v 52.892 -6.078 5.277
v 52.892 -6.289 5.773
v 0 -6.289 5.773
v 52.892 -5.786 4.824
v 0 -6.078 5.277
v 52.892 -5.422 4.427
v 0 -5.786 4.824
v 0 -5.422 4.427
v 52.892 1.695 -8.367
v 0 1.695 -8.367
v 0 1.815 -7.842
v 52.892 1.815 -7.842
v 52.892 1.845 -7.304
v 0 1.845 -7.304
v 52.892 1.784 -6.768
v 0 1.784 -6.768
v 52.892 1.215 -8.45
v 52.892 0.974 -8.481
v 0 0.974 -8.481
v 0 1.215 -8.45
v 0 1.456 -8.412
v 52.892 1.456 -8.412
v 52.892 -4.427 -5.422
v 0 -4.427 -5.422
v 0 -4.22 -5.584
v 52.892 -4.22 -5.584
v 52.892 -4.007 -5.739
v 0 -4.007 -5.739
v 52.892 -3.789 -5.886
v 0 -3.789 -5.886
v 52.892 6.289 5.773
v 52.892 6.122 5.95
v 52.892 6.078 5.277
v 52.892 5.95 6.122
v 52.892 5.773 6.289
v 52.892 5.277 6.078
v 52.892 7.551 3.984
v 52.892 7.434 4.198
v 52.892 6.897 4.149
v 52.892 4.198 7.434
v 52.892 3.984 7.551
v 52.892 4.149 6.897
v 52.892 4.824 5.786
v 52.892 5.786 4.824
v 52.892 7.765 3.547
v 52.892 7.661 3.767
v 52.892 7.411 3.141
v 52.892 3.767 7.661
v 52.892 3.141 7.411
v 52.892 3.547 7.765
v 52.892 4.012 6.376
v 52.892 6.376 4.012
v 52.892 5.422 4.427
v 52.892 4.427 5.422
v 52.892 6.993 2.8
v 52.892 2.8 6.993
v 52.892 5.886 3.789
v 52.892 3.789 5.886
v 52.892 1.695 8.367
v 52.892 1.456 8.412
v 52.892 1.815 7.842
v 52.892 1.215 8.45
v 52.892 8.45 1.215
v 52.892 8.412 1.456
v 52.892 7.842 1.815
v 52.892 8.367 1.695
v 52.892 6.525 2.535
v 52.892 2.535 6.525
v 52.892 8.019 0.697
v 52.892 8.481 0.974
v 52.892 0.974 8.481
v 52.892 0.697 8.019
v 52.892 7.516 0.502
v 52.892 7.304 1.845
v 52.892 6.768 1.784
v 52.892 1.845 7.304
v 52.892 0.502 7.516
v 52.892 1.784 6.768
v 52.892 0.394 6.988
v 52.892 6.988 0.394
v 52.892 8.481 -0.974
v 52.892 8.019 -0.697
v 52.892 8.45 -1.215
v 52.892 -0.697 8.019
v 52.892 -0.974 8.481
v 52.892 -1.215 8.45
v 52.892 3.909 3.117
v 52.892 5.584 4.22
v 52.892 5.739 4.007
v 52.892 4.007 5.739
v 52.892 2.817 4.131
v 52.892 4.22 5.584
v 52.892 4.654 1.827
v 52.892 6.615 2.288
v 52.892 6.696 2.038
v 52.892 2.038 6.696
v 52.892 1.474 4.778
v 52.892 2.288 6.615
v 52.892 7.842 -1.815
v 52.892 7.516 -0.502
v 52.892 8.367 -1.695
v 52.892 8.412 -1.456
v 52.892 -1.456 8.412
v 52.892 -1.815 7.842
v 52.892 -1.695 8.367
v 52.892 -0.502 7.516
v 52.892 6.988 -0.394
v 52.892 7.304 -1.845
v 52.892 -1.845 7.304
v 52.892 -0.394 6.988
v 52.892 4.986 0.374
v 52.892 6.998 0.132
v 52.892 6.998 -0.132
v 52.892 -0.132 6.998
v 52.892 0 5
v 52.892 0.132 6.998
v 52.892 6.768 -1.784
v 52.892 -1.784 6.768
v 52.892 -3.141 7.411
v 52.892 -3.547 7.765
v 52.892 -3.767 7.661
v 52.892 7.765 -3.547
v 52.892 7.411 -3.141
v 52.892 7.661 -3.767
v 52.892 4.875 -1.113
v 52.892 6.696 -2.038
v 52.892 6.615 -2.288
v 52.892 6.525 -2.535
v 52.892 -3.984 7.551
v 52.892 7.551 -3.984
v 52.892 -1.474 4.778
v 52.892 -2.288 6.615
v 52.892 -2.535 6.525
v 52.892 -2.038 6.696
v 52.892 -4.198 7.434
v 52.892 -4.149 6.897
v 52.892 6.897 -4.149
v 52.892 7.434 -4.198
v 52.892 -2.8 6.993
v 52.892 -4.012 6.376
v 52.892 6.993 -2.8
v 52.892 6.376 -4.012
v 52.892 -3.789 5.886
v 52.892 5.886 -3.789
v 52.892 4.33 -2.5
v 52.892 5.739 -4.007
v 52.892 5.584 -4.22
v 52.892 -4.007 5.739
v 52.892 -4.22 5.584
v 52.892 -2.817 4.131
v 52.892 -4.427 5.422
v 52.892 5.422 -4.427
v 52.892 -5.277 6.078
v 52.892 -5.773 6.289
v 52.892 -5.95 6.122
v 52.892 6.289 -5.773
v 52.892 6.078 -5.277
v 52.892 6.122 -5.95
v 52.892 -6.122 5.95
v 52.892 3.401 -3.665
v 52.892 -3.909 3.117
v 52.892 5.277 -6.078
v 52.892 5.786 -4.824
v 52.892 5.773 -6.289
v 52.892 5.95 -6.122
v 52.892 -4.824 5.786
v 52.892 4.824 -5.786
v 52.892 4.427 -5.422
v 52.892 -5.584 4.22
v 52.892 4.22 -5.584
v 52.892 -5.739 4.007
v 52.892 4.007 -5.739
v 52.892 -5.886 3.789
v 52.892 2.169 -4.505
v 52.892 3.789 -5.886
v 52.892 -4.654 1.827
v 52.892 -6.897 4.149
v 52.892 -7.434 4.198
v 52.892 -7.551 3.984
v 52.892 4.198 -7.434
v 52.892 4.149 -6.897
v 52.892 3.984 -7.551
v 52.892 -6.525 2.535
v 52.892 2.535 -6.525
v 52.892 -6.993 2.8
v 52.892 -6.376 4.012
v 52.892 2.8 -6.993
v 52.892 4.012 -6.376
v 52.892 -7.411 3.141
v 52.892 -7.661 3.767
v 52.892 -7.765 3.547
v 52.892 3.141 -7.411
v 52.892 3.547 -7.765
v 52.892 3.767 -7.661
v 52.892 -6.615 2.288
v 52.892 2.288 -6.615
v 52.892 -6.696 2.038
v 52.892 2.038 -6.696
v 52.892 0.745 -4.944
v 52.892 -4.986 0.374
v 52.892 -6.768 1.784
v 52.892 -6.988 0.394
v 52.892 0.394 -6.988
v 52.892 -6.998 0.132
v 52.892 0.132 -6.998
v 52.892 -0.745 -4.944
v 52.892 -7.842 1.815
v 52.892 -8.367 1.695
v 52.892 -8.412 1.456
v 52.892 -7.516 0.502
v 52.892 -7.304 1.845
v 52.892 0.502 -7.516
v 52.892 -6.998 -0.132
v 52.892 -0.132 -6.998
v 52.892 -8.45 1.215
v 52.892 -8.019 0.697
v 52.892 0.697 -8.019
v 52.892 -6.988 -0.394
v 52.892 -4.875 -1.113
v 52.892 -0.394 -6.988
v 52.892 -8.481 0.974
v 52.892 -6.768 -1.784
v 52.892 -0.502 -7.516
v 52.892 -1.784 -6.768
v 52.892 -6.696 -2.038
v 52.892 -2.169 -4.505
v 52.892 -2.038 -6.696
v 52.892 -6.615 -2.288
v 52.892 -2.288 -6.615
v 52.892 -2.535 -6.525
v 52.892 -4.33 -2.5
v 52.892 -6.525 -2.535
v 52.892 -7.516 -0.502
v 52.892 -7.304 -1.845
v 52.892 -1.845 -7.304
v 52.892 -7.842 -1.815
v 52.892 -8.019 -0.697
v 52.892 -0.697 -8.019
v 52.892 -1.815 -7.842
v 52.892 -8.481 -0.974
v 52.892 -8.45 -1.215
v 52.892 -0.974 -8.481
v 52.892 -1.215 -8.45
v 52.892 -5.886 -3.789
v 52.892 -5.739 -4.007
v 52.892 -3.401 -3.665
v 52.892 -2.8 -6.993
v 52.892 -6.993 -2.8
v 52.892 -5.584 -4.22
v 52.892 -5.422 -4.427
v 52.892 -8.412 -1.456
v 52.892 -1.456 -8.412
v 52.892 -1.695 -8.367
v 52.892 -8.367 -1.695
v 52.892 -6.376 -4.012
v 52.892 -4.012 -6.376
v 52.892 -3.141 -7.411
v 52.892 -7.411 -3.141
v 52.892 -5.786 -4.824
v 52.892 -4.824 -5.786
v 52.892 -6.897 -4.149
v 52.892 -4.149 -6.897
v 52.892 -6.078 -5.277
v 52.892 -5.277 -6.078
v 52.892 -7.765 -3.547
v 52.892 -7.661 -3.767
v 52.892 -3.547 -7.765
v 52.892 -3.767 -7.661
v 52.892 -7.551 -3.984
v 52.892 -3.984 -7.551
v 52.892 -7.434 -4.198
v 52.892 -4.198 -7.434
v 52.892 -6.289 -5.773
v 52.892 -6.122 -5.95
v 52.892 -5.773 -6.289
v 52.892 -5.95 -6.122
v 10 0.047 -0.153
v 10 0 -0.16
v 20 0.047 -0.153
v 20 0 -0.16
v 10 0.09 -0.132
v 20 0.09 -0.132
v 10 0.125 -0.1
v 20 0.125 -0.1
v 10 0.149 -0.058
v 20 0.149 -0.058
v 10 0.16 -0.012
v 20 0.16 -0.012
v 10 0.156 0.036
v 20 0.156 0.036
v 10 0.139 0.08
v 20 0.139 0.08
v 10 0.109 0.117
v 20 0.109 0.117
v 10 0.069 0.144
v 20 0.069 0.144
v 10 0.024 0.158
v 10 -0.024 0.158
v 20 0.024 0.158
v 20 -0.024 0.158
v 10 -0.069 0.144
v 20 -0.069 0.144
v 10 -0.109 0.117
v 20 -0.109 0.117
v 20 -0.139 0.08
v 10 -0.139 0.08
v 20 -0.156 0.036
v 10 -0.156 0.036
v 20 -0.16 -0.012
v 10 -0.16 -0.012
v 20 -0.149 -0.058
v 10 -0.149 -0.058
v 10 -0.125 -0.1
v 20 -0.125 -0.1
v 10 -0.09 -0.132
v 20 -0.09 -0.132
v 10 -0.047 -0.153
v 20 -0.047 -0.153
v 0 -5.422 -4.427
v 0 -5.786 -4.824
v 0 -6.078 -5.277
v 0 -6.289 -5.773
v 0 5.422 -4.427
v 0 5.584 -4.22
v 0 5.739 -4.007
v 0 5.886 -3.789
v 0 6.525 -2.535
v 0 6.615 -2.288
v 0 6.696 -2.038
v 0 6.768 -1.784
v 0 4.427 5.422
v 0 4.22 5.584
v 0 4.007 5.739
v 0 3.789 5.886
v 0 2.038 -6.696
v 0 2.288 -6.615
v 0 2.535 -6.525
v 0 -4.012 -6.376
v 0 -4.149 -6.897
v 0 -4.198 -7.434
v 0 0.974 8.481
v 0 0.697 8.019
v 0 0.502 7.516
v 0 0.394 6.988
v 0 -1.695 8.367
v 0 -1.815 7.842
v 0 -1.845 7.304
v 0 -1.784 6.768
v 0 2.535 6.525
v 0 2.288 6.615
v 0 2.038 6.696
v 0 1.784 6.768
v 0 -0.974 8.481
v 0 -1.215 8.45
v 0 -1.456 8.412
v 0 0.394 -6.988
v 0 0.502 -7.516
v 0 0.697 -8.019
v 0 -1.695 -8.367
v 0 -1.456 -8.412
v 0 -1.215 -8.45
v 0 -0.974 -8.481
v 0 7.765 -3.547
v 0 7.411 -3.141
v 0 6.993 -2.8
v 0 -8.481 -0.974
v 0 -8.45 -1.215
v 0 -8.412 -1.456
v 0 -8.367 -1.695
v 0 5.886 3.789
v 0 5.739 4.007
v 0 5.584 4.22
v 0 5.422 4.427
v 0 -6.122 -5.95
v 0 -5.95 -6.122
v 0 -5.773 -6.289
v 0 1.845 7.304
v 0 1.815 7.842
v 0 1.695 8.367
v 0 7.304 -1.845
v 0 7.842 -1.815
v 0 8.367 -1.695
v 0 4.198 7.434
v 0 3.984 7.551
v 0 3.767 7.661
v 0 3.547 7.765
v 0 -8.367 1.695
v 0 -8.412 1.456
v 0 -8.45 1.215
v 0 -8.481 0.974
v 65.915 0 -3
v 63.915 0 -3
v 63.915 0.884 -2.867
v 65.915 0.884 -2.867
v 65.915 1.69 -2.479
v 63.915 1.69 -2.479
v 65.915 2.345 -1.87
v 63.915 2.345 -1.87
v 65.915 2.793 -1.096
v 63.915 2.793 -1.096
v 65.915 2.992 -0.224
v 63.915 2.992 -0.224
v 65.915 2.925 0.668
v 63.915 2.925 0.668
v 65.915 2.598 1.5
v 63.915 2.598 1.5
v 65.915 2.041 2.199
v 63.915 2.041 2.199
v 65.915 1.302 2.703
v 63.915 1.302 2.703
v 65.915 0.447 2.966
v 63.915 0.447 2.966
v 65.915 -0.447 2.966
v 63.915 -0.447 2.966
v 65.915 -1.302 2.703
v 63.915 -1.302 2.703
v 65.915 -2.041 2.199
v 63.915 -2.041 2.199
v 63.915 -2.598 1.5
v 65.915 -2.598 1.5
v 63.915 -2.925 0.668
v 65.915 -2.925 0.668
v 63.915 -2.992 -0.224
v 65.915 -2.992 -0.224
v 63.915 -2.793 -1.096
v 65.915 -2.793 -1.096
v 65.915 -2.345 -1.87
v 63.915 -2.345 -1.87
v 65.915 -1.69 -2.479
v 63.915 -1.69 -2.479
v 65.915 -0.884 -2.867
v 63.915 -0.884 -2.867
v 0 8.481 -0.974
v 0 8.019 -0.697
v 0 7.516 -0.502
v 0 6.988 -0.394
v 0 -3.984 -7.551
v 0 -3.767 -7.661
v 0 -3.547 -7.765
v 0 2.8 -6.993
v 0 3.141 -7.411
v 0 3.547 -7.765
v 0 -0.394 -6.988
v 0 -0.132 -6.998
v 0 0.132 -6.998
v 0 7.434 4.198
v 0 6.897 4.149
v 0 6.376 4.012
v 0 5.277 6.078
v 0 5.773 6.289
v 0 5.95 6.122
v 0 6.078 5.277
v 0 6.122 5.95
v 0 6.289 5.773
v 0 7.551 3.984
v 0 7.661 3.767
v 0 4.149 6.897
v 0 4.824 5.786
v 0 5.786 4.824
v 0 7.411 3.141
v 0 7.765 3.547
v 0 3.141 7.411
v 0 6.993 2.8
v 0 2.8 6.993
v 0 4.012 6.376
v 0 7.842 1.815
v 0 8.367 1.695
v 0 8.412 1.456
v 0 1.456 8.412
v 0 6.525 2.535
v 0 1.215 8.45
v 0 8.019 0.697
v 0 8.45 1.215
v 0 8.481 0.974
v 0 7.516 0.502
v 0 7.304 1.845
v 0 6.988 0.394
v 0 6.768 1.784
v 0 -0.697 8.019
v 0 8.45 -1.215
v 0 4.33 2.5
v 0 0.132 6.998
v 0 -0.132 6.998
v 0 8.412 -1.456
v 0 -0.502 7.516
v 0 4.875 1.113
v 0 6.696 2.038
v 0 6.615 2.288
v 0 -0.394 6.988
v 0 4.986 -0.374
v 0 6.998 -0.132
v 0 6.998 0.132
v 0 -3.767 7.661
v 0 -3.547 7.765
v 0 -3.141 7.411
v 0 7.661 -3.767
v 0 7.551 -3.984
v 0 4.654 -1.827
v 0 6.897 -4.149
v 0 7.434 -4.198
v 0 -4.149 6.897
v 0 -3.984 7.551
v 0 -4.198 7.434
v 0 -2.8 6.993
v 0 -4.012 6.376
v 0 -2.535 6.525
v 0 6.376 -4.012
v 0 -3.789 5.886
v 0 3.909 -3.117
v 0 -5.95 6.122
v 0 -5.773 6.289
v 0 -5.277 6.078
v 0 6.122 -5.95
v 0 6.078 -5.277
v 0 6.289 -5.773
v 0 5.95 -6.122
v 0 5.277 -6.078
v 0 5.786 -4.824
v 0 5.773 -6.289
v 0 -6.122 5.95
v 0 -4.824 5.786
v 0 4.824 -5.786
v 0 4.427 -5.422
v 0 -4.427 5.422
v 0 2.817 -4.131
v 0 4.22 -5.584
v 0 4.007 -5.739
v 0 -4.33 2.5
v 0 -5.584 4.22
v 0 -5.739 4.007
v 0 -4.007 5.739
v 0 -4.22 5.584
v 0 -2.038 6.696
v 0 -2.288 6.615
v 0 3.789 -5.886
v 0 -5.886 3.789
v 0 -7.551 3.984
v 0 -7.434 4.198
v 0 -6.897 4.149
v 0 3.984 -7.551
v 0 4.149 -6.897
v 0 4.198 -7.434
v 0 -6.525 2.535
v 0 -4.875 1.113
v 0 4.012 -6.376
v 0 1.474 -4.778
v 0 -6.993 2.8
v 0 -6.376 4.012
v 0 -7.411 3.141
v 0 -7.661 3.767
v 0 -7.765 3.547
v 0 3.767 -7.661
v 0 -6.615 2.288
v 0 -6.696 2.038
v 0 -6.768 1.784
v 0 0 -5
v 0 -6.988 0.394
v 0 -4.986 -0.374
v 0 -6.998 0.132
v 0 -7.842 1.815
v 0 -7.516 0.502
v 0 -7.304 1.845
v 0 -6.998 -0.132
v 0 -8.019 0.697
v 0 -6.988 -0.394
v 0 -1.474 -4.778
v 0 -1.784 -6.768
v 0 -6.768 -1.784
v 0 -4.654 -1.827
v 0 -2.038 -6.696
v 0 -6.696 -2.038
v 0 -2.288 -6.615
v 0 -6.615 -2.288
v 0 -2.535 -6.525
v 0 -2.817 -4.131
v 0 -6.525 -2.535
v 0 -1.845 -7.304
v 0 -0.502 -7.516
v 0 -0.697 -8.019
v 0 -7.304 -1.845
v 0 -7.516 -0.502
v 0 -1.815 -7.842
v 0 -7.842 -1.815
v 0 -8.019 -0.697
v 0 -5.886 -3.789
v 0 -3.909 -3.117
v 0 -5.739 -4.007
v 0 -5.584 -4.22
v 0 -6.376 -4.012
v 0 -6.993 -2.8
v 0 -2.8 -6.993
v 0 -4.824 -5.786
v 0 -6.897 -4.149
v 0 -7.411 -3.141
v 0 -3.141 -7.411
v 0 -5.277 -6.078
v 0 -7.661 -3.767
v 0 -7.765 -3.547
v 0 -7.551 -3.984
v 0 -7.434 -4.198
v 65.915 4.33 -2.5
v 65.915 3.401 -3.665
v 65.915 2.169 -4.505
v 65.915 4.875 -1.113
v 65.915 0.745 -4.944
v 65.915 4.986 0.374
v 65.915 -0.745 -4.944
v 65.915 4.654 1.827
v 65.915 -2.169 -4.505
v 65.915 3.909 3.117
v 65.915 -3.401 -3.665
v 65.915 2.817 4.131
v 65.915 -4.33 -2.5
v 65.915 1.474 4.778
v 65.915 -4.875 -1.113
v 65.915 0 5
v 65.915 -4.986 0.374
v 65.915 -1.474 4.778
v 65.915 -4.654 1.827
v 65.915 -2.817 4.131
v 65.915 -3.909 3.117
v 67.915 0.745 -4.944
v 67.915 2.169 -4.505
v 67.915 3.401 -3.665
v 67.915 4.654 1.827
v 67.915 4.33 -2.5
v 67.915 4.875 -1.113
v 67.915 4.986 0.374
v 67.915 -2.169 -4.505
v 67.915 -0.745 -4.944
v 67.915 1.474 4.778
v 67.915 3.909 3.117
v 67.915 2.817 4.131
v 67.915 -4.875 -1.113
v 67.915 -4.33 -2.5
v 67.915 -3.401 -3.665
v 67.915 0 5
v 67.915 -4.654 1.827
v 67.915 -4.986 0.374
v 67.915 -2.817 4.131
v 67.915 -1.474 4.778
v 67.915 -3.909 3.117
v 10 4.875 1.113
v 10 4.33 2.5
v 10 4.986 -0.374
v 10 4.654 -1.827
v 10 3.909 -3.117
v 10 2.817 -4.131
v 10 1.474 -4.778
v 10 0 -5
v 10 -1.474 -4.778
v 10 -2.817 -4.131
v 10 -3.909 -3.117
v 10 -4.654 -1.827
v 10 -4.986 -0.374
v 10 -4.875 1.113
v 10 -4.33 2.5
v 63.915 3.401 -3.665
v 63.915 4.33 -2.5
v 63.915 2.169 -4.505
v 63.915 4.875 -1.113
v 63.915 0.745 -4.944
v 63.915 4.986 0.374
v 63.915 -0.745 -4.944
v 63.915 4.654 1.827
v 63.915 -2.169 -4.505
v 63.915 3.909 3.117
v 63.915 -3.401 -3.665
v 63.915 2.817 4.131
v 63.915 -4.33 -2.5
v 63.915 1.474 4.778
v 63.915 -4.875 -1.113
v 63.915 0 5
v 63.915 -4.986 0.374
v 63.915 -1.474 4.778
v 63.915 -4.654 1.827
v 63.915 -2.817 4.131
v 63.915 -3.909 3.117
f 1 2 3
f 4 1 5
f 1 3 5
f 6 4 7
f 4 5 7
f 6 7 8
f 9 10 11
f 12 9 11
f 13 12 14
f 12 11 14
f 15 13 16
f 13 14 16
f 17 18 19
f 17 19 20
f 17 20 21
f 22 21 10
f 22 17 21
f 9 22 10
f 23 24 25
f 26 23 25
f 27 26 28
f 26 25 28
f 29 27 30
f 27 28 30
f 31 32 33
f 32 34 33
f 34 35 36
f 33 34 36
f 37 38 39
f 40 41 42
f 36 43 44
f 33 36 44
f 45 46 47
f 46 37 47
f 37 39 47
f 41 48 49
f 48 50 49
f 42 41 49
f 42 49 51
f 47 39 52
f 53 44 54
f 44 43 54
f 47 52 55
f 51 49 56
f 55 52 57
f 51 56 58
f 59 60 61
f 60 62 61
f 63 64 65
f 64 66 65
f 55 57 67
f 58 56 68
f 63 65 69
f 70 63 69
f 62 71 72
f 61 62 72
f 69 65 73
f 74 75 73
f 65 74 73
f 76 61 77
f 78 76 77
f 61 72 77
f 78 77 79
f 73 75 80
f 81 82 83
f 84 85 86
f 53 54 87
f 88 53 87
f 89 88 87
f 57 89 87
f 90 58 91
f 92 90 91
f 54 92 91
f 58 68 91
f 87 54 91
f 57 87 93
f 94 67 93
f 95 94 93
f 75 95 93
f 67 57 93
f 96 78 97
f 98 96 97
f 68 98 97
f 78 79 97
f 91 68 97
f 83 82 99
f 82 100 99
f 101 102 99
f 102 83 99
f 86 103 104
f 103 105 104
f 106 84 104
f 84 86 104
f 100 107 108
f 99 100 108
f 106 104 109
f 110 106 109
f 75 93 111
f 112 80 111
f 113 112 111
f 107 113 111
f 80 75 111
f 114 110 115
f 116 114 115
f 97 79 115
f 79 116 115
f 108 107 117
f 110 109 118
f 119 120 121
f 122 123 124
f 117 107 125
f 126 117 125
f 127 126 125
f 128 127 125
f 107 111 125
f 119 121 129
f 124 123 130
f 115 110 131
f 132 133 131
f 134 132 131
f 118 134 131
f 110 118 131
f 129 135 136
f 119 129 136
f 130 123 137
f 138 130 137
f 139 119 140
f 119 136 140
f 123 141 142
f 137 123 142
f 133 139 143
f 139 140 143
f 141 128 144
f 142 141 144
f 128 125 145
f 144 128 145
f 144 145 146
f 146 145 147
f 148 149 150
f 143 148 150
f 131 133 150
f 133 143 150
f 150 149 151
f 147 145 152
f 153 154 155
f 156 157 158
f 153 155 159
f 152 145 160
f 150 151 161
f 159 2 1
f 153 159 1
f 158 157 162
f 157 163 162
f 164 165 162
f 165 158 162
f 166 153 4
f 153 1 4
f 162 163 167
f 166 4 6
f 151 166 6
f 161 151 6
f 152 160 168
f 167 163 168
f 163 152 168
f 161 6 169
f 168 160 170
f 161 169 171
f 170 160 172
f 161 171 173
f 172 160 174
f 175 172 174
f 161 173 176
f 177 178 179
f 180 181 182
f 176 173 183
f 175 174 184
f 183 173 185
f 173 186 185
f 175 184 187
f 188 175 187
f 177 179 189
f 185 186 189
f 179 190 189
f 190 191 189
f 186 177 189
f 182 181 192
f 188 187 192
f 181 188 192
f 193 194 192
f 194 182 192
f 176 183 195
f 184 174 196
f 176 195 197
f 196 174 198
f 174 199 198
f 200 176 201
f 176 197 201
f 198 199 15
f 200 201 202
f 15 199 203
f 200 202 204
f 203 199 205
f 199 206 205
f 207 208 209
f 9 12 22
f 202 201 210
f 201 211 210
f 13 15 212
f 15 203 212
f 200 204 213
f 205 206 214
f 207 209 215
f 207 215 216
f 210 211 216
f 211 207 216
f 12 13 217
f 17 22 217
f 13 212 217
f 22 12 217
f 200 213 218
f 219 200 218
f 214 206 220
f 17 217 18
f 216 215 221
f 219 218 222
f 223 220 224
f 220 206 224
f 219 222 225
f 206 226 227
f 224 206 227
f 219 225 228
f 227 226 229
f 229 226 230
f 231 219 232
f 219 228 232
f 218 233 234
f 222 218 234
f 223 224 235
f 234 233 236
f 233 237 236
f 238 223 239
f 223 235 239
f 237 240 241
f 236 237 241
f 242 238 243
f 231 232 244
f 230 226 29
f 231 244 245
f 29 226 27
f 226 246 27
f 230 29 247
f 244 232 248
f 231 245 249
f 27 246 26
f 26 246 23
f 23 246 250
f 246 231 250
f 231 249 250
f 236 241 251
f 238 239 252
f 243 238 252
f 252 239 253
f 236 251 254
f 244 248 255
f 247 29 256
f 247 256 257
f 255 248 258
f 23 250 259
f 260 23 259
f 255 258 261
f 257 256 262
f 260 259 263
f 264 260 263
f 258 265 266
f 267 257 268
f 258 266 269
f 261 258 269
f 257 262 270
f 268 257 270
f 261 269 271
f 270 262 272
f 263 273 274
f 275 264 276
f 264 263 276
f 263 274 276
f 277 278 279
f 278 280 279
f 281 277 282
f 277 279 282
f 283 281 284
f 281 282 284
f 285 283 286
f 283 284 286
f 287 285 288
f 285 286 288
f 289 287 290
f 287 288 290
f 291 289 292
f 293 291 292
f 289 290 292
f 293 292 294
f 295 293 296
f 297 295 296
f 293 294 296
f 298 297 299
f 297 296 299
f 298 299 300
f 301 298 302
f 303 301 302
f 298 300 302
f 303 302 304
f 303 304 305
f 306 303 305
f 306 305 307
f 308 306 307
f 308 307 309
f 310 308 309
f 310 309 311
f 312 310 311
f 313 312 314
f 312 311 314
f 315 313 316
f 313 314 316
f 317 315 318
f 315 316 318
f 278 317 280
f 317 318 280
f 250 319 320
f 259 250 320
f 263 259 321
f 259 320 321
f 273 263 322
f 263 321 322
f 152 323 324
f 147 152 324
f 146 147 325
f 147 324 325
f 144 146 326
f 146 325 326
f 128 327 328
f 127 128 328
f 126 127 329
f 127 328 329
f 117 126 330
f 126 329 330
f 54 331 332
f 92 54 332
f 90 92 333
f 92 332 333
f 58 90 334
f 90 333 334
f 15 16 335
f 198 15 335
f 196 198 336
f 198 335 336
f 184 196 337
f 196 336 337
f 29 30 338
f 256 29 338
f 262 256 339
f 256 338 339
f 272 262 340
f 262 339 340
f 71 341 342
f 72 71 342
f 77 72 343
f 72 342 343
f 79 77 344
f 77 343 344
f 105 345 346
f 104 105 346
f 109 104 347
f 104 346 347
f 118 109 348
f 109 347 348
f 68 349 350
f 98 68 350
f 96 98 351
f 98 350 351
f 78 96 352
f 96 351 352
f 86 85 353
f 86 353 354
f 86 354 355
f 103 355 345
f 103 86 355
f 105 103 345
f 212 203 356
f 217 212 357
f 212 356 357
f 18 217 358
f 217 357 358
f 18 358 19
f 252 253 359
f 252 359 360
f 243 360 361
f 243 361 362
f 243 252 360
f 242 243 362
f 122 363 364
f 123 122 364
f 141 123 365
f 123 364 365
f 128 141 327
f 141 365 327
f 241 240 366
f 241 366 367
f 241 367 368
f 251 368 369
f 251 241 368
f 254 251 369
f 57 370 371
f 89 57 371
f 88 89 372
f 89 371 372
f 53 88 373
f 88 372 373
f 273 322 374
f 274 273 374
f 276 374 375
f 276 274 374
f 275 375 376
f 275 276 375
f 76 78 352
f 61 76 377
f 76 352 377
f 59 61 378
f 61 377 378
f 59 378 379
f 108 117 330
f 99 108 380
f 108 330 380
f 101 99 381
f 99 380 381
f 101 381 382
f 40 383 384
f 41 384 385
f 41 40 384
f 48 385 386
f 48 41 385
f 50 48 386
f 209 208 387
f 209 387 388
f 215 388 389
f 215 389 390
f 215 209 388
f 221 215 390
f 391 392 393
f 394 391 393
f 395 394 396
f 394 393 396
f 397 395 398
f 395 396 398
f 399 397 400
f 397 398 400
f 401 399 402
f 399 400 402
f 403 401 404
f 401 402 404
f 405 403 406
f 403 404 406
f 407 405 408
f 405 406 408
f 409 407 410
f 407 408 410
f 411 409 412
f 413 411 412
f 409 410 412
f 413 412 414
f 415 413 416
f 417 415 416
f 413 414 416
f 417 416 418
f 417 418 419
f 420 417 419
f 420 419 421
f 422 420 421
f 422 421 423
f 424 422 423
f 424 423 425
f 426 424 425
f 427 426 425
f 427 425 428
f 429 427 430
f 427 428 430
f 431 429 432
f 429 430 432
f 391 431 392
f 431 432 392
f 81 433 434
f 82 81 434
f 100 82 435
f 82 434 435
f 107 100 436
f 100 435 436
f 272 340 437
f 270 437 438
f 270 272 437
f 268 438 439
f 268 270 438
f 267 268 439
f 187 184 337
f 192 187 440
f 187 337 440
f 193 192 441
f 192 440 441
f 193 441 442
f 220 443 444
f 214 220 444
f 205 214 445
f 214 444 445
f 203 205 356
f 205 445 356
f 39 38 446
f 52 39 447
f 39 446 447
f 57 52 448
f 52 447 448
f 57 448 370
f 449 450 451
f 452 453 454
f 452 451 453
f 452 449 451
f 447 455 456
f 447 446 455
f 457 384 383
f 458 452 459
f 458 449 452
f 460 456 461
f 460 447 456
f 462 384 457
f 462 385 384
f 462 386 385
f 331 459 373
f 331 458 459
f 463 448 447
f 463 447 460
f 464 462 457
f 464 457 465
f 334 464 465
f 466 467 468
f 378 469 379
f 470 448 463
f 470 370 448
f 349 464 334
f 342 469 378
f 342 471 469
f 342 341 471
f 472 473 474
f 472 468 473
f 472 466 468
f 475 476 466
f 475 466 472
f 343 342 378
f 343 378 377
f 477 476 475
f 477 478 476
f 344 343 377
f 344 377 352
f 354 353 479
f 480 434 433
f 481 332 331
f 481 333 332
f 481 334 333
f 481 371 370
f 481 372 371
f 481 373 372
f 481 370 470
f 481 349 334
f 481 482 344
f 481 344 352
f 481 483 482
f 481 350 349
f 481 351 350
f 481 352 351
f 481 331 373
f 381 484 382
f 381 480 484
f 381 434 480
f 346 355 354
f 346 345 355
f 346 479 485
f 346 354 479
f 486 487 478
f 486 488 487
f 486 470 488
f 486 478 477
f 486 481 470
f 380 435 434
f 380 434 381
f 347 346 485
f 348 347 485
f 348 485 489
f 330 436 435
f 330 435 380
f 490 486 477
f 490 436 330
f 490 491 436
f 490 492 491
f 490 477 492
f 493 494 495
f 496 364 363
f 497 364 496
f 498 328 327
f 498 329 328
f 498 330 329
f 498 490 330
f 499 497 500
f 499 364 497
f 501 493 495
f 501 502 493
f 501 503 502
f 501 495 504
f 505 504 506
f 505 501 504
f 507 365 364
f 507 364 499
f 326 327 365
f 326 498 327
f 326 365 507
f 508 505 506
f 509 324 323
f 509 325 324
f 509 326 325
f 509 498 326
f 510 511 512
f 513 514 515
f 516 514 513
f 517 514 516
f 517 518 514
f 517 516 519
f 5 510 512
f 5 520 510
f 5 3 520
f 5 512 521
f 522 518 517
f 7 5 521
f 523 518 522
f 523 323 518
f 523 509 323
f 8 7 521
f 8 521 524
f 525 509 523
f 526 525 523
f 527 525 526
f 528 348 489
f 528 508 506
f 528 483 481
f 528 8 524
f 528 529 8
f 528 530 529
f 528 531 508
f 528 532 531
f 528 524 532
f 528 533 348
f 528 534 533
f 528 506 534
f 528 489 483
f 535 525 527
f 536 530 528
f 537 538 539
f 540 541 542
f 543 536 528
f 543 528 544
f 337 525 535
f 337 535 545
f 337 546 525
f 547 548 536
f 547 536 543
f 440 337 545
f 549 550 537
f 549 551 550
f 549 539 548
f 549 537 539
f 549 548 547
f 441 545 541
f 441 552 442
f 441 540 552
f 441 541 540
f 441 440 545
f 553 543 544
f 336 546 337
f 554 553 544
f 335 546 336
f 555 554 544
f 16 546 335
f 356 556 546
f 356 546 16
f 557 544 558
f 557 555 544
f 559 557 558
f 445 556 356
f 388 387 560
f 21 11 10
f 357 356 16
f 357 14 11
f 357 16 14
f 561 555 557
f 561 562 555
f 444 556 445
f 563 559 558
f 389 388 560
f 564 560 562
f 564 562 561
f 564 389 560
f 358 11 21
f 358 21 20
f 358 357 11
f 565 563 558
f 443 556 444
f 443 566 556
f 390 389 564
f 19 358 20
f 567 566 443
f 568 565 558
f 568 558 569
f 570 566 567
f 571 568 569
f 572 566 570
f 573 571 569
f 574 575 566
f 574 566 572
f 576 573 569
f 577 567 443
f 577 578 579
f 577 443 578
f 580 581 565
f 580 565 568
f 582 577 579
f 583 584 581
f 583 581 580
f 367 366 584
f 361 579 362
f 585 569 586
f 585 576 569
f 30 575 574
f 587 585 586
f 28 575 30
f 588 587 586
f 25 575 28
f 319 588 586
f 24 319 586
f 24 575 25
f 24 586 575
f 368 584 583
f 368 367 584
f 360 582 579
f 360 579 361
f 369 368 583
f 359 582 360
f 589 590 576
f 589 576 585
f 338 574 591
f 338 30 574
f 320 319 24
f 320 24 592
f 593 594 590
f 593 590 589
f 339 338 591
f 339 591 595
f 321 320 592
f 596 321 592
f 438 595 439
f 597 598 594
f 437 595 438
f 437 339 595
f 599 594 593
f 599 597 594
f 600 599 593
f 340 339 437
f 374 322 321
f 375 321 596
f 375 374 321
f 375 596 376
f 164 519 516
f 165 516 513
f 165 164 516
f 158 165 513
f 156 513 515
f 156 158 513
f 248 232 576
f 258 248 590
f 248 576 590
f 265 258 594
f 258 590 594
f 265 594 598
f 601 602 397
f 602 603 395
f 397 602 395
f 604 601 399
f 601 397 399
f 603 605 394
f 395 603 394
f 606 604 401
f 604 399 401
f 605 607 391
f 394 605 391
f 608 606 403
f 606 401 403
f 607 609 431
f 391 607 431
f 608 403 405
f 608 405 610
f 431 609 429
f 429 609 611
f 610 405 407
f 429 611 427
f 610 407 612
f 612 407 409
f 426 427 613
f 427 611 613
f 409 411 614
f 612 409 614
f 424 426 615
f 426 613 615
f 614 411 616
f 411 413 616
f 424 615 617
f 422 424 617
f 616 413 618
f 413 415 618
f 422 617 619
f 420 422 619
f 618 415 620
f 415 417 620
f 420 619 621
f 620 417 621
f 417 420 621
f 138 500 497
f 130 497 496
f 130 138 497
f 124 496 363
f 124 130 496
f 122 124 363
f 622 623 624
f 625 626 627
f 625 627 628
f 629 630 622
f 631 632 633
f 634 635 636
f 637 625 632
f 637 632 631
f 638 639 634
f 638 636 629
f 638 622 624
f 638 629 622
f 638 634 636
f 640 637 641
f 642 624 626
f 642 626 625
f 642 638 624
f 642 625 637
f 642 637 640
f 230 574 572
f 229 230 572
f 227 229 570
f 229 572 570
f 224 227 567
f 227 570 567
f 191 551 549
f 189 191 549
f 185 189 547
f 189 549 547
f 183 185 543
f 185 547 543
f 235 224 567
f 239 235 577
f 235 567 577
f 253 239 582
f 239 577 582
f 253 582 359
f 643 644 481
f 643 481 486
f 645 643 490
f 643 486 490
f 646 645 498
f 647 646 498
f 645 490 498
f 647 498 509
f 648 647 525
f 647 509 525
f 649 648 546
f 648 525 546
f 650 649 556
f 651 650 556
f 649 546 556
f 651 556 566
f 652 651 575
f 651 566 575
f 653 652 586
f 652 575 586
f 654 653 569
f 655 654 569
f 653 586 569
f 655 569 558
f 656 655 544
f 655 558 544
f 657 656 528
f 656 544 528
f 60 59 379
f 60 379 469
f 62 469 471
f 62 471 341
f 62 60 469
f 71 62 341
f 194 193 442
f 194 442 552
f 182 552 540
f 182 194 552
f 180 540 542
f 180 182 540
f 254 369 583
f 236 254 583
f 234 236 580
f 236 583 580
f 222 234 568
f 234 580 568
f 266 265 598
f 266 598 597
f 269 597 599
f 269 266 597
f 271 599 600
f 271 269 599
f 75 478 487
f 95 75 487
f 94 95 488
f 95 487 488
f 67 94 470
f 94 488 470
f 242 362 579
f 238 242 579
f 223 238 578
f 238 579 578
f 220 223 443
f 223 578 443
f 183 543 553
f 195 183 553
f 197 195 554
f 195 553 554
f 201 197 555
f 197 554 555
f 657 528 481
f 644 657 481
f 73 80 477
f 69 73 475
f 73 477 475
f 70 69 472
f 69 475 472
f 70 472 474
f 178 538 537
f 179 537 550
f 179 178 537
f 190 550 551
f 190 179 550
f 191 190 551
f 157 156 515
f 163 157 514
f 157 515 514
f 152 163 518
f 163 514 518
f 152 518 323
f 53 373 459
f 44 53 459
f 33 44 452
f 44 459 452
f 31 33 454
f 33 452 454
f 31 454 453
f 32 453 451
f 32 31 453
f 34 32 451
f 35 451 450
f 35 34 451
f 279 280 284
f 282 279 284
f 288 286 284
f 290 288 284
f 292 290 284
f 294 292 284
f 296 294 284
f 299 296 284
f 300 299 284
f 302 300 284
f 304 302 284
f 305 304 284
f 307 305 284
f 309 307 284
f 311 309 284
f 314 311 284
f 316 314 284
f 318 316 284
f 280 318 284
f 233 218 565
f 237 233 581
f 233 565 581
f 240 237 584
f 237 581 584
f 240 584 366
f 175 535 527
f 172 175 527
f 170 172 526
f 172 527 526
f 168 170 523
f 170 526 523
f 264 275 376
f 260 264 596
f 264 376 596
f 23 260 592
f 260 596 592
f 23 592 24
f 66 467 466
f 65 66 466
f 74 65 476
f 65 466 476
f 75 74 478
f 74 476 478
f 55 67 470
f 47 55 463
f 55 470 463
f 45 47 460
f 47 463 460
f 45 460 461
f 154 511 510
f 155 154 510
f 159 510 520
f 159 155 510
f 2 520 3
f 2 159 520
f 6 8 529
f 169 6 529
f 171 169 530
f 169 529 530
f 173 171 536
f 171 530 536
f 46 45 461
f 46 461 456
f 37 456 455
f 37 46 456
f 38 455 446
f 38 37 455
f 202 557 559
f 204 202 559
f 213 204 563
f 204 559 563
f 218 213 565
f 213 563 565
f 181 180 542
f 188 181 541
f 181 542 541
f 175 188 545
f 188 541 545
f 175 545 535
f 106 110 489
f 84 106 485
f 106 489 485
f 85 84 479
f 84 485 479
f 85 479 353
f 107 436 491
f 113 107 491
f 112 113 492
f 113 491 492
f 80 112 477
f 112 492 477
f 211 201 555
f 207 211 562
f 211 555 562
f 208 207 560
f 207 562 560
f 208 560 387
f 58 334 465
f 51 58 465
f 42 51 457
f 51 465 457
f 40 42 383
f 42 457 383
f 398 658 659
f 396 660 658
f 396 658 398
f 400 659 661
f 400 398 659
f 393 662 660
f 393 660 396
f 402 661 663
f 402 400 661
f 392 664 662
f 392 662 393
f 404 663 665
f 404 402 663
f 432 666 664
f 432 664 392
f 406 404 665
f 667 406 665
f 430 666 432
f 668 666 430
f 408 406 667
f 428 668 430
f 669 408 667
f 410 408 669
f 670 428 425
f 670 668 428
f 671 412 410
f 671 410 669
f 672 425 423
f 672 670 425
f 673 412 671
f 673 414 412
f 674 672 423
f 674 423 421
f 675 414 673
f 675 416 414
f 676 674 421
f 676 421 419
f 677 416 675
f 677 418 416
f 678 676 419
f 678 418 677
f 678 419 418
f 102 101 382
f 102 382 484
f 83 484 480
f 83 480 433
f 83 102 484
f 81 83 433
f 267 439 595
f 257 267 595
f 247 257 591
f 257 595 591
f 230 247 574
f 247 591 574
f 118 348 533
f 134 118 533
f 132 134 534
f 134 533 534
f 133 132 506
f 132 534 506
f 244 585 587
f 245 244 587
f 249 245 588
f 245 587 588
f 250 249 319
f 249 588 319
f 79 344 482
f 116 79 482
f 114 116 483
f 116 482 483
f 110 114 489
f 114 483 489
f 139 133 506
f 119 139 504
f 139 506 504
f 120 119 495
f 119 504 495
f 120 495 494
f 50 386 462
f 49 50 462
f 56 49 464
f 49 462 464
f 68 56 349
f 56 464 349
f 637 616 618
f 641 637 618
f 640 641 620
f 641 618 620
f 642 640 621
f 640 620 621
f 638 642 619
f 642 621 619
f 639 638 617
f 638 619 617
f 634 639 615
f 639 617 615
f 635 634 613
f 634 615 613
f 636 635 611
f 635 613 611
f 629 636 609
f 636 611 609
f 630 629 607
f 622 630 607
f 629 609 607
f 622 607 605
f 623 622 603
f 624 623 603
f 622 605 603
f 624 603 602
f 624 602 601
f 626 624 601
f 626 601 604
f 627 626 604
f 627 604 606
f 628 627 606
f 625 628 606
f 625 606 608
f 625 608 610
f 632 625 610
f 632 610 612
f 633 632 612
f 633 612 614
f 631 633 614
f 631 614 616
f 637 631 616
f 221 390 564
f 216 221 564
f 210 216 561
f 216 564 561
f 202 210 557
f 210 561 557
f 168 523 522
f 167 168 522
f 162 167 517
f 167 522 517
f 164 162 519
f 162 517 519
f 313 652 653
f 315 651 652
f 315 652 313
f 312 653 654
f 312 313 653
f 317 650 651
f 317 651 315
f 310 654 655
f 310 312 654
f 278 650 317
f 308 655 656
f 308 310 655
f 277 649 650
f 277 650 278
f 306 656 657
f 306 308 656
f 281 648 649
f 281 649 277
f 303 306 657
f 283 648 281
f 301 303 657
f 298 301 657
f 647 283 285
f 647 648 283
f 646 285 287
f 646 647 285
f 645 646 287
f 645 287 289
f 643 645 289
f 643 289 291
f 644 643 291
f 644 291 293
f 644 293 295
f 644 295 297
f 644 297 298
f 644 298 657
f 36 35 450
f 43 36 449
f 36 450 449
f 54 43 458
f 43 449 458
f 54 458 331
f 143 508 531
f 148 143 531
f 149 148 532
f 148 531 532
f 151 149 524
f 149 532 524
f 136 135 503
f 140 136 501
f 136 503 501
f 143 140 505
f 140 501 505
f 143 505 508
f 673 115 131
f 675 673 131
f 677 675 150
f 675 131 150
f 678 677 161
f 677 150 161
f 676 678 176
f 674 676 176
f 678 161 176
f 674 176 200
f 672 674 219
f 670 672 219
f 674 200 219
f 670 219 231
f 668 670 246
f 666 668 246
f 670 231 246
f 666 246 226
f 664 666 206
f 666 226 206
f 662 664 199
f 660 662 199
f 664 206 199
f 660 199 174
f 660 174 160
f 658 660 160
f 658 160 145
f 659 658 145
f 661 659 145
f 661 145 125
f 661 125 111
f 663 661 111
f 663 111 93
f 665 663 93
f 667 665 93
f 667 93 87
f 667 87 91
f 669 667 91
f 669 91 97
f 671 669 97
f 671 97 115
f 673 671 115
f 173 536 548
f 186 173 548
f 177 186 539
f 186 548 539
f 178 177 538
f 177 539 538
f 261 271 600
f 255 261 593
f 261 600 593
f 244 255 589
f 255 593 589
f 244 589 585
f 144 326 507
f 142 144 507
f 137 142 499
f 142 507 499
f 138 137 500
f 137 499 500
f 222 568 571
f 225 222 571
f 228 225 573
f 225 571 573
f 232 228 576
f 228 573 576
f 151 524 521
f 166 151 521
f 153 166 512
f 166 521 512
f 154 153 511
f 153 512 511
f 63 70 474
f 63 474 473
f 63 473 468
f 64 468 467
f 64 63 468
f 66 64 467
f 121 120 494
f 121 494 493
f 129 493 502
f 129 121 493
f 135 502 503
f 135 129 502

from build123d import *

# Parameters (mm, degrees)
BASPROSKE_W         = 132.2299391
BASPROSKE_H         = 22
TOOTHCUT_DEPTH      = 136.840924593
TEETHCUTS_COUNT     = 20
TEETHCUTS_ANGLE     = 342
BORSKE_R            = 0.4
BORE_DEPTH          = 50.0000508
SKETCH1_R           = 22
SKETCH1_R_2         = 21.342673338
CUT_EXTRUDE1_DEPTH  = 136.778456297
SCALE1_SCALE        = 0.4
SKETCH6_R           = 5
BOSS_EXTRUDE3_DEPTH = 15.0233807
CUT_EXTRUDE2_DEPTH  = 10
CUT_EXTRUDE3_START  = -2
SKETCH8_R           = 5
SKETCH8_R_2         = 3
CUT_EXTRUDE3_DEPTH  = 2


with BuildPart() as part:
    # BasProSke → Base-Revolve (revolve)
    with BuildSketch(Plane(origin=(0, 0, 0), x_dir=(1, 0, 0), z_dir=(0, 1, 0)), mode=Mode.PRIVATE) as base_revolve_sk:
        with Locations((66.11496955, 11)):
            Rectangle(BASPROSKE_W, BASPROSKE_H)
    revolve(base_revolve_sk.sketch.rotate(Axis((-10, 0, 0), (1, 0, 0)), 180), axis=Axis((-10, 0, 0), (1, 0, 0)))

    # TooCutSke → ToothCut (cut, through all)
    with BuildSketch(Plane(origin=(0, 0, 0), x_dir=(0, 0, -1), z_dir=(1, 0, 0))):
        with BuildLine():
            ThreePointArc((0.986171591, 17.471189616), (0, 17.499), (-0.986171591, 17.471189616))
            ThreePointArc((-0.986171591, 17.471189616), (-1.626916196, 19.798789858), (-2.932850173, 21.829260982))
            ThreePointArc((-2.932850173, 21.829260982), (0, 22.0254), (2.932850173, 21.829260982))
            ThreePointArc((2.932850173, 21.829260982), (1.626916196, 19.798789858), (0.986171591, 17.471189616))
        make_face()
    toothcut = extrude(amount=TOOTHCUT_DEPTH, mode=Mode.SUBTRACT)

    # TeethCuts: ToothCut ×20 about axis
    teethcuts_axis = Axis((-10, 0, 0), (1, 0, 0))
    for i in range(1, TEETHCUTS_COUNT):
        add(toothcut.rotate(teethcuts_axis, i * TEETHCUTS_ANGLE / (TEETHCUTS_COUNT - 1)), mode=Mode.SUBTRACT)

    # BorSke → Bore (cut, symmetric)
    with BuildSketch(Plane(origin=(0, 0, 0), x_dir=(0, 0, -1), z_dir=(1, 0, 0))):
        Circle(BORSKE_R)
    extrude(amount=BORE_DEPTH, both=True, mode=Mode.SUBTRACT)

    # Sketch1 → Cut-Extrude1 (cut, through all)
    with BuildSketch(Plane(origin=(132.2299391, 0, 0), x_dir=(0, 0, -1), z_dir=(1, 0, 0))):
        Circle(SKETCH1_R)
        Circle(SKETCH1_R_2, mode=Mode.SUBTRACT)
    extrude(amount=-CUT_EXTRUDE1_DEPTH, mode=Mode.SUBTRACT)


with BuildPart() as part_1:
    # Scale1: scaled about (0, 0, 0)
    add(part.part.scale(SCALE1_SCALE))

    # Sketch6 → Boss-Extrude3 (add)
    with BuildSketch(Plane(origin=(52.89197564, 0, 0), x_dir=(0, 0, -1), z_dir=(1, 0, 0))):
        with Locations(Location((0, 0, 0), (0, 0, 180))):
            Circle(SKETCH6_R)
    extrude(amount=BOSS_EXTRUDE3_DEPTH)

    # Sketch7 → Cut-Extrude2 (cut)
    with BuildSketch(Plane.ZY):
        with BuildLine():
            Line((2.5, 0), (2.5, 4.330127019))
            ThreePointArc((2.5, 4.330127019), (-5, 0), (2.5, -4.330127019))
            Line((2.5, -4.330127019), (2.5, 0))
        make_face()
    extrude(amount=-CUT_EXTRUDE2_DEPTH, mode=Mode.SUBTRACT)

    # Sketch8 → Cut-Extrude3 (cut)
    with BuildSketch(Plane(origin=(65.91535634, 0, 0), x_dir=(0, 0, -1), z_dir=(1, 0, 0)).offset(CUT_EXTRUDE3_START)):
        with Locations(Location((0, 0, 0), (0, 0, 180))):
            Circle(SKETCH8_R)
        Circle(SKETCH8_R_2, mode=Mode.SUBTRACT)
    extrude(amount=CUT_EXTRUDE3_DEPTH, mode=Mode.SUBTRACT)


solid = part_1.part
